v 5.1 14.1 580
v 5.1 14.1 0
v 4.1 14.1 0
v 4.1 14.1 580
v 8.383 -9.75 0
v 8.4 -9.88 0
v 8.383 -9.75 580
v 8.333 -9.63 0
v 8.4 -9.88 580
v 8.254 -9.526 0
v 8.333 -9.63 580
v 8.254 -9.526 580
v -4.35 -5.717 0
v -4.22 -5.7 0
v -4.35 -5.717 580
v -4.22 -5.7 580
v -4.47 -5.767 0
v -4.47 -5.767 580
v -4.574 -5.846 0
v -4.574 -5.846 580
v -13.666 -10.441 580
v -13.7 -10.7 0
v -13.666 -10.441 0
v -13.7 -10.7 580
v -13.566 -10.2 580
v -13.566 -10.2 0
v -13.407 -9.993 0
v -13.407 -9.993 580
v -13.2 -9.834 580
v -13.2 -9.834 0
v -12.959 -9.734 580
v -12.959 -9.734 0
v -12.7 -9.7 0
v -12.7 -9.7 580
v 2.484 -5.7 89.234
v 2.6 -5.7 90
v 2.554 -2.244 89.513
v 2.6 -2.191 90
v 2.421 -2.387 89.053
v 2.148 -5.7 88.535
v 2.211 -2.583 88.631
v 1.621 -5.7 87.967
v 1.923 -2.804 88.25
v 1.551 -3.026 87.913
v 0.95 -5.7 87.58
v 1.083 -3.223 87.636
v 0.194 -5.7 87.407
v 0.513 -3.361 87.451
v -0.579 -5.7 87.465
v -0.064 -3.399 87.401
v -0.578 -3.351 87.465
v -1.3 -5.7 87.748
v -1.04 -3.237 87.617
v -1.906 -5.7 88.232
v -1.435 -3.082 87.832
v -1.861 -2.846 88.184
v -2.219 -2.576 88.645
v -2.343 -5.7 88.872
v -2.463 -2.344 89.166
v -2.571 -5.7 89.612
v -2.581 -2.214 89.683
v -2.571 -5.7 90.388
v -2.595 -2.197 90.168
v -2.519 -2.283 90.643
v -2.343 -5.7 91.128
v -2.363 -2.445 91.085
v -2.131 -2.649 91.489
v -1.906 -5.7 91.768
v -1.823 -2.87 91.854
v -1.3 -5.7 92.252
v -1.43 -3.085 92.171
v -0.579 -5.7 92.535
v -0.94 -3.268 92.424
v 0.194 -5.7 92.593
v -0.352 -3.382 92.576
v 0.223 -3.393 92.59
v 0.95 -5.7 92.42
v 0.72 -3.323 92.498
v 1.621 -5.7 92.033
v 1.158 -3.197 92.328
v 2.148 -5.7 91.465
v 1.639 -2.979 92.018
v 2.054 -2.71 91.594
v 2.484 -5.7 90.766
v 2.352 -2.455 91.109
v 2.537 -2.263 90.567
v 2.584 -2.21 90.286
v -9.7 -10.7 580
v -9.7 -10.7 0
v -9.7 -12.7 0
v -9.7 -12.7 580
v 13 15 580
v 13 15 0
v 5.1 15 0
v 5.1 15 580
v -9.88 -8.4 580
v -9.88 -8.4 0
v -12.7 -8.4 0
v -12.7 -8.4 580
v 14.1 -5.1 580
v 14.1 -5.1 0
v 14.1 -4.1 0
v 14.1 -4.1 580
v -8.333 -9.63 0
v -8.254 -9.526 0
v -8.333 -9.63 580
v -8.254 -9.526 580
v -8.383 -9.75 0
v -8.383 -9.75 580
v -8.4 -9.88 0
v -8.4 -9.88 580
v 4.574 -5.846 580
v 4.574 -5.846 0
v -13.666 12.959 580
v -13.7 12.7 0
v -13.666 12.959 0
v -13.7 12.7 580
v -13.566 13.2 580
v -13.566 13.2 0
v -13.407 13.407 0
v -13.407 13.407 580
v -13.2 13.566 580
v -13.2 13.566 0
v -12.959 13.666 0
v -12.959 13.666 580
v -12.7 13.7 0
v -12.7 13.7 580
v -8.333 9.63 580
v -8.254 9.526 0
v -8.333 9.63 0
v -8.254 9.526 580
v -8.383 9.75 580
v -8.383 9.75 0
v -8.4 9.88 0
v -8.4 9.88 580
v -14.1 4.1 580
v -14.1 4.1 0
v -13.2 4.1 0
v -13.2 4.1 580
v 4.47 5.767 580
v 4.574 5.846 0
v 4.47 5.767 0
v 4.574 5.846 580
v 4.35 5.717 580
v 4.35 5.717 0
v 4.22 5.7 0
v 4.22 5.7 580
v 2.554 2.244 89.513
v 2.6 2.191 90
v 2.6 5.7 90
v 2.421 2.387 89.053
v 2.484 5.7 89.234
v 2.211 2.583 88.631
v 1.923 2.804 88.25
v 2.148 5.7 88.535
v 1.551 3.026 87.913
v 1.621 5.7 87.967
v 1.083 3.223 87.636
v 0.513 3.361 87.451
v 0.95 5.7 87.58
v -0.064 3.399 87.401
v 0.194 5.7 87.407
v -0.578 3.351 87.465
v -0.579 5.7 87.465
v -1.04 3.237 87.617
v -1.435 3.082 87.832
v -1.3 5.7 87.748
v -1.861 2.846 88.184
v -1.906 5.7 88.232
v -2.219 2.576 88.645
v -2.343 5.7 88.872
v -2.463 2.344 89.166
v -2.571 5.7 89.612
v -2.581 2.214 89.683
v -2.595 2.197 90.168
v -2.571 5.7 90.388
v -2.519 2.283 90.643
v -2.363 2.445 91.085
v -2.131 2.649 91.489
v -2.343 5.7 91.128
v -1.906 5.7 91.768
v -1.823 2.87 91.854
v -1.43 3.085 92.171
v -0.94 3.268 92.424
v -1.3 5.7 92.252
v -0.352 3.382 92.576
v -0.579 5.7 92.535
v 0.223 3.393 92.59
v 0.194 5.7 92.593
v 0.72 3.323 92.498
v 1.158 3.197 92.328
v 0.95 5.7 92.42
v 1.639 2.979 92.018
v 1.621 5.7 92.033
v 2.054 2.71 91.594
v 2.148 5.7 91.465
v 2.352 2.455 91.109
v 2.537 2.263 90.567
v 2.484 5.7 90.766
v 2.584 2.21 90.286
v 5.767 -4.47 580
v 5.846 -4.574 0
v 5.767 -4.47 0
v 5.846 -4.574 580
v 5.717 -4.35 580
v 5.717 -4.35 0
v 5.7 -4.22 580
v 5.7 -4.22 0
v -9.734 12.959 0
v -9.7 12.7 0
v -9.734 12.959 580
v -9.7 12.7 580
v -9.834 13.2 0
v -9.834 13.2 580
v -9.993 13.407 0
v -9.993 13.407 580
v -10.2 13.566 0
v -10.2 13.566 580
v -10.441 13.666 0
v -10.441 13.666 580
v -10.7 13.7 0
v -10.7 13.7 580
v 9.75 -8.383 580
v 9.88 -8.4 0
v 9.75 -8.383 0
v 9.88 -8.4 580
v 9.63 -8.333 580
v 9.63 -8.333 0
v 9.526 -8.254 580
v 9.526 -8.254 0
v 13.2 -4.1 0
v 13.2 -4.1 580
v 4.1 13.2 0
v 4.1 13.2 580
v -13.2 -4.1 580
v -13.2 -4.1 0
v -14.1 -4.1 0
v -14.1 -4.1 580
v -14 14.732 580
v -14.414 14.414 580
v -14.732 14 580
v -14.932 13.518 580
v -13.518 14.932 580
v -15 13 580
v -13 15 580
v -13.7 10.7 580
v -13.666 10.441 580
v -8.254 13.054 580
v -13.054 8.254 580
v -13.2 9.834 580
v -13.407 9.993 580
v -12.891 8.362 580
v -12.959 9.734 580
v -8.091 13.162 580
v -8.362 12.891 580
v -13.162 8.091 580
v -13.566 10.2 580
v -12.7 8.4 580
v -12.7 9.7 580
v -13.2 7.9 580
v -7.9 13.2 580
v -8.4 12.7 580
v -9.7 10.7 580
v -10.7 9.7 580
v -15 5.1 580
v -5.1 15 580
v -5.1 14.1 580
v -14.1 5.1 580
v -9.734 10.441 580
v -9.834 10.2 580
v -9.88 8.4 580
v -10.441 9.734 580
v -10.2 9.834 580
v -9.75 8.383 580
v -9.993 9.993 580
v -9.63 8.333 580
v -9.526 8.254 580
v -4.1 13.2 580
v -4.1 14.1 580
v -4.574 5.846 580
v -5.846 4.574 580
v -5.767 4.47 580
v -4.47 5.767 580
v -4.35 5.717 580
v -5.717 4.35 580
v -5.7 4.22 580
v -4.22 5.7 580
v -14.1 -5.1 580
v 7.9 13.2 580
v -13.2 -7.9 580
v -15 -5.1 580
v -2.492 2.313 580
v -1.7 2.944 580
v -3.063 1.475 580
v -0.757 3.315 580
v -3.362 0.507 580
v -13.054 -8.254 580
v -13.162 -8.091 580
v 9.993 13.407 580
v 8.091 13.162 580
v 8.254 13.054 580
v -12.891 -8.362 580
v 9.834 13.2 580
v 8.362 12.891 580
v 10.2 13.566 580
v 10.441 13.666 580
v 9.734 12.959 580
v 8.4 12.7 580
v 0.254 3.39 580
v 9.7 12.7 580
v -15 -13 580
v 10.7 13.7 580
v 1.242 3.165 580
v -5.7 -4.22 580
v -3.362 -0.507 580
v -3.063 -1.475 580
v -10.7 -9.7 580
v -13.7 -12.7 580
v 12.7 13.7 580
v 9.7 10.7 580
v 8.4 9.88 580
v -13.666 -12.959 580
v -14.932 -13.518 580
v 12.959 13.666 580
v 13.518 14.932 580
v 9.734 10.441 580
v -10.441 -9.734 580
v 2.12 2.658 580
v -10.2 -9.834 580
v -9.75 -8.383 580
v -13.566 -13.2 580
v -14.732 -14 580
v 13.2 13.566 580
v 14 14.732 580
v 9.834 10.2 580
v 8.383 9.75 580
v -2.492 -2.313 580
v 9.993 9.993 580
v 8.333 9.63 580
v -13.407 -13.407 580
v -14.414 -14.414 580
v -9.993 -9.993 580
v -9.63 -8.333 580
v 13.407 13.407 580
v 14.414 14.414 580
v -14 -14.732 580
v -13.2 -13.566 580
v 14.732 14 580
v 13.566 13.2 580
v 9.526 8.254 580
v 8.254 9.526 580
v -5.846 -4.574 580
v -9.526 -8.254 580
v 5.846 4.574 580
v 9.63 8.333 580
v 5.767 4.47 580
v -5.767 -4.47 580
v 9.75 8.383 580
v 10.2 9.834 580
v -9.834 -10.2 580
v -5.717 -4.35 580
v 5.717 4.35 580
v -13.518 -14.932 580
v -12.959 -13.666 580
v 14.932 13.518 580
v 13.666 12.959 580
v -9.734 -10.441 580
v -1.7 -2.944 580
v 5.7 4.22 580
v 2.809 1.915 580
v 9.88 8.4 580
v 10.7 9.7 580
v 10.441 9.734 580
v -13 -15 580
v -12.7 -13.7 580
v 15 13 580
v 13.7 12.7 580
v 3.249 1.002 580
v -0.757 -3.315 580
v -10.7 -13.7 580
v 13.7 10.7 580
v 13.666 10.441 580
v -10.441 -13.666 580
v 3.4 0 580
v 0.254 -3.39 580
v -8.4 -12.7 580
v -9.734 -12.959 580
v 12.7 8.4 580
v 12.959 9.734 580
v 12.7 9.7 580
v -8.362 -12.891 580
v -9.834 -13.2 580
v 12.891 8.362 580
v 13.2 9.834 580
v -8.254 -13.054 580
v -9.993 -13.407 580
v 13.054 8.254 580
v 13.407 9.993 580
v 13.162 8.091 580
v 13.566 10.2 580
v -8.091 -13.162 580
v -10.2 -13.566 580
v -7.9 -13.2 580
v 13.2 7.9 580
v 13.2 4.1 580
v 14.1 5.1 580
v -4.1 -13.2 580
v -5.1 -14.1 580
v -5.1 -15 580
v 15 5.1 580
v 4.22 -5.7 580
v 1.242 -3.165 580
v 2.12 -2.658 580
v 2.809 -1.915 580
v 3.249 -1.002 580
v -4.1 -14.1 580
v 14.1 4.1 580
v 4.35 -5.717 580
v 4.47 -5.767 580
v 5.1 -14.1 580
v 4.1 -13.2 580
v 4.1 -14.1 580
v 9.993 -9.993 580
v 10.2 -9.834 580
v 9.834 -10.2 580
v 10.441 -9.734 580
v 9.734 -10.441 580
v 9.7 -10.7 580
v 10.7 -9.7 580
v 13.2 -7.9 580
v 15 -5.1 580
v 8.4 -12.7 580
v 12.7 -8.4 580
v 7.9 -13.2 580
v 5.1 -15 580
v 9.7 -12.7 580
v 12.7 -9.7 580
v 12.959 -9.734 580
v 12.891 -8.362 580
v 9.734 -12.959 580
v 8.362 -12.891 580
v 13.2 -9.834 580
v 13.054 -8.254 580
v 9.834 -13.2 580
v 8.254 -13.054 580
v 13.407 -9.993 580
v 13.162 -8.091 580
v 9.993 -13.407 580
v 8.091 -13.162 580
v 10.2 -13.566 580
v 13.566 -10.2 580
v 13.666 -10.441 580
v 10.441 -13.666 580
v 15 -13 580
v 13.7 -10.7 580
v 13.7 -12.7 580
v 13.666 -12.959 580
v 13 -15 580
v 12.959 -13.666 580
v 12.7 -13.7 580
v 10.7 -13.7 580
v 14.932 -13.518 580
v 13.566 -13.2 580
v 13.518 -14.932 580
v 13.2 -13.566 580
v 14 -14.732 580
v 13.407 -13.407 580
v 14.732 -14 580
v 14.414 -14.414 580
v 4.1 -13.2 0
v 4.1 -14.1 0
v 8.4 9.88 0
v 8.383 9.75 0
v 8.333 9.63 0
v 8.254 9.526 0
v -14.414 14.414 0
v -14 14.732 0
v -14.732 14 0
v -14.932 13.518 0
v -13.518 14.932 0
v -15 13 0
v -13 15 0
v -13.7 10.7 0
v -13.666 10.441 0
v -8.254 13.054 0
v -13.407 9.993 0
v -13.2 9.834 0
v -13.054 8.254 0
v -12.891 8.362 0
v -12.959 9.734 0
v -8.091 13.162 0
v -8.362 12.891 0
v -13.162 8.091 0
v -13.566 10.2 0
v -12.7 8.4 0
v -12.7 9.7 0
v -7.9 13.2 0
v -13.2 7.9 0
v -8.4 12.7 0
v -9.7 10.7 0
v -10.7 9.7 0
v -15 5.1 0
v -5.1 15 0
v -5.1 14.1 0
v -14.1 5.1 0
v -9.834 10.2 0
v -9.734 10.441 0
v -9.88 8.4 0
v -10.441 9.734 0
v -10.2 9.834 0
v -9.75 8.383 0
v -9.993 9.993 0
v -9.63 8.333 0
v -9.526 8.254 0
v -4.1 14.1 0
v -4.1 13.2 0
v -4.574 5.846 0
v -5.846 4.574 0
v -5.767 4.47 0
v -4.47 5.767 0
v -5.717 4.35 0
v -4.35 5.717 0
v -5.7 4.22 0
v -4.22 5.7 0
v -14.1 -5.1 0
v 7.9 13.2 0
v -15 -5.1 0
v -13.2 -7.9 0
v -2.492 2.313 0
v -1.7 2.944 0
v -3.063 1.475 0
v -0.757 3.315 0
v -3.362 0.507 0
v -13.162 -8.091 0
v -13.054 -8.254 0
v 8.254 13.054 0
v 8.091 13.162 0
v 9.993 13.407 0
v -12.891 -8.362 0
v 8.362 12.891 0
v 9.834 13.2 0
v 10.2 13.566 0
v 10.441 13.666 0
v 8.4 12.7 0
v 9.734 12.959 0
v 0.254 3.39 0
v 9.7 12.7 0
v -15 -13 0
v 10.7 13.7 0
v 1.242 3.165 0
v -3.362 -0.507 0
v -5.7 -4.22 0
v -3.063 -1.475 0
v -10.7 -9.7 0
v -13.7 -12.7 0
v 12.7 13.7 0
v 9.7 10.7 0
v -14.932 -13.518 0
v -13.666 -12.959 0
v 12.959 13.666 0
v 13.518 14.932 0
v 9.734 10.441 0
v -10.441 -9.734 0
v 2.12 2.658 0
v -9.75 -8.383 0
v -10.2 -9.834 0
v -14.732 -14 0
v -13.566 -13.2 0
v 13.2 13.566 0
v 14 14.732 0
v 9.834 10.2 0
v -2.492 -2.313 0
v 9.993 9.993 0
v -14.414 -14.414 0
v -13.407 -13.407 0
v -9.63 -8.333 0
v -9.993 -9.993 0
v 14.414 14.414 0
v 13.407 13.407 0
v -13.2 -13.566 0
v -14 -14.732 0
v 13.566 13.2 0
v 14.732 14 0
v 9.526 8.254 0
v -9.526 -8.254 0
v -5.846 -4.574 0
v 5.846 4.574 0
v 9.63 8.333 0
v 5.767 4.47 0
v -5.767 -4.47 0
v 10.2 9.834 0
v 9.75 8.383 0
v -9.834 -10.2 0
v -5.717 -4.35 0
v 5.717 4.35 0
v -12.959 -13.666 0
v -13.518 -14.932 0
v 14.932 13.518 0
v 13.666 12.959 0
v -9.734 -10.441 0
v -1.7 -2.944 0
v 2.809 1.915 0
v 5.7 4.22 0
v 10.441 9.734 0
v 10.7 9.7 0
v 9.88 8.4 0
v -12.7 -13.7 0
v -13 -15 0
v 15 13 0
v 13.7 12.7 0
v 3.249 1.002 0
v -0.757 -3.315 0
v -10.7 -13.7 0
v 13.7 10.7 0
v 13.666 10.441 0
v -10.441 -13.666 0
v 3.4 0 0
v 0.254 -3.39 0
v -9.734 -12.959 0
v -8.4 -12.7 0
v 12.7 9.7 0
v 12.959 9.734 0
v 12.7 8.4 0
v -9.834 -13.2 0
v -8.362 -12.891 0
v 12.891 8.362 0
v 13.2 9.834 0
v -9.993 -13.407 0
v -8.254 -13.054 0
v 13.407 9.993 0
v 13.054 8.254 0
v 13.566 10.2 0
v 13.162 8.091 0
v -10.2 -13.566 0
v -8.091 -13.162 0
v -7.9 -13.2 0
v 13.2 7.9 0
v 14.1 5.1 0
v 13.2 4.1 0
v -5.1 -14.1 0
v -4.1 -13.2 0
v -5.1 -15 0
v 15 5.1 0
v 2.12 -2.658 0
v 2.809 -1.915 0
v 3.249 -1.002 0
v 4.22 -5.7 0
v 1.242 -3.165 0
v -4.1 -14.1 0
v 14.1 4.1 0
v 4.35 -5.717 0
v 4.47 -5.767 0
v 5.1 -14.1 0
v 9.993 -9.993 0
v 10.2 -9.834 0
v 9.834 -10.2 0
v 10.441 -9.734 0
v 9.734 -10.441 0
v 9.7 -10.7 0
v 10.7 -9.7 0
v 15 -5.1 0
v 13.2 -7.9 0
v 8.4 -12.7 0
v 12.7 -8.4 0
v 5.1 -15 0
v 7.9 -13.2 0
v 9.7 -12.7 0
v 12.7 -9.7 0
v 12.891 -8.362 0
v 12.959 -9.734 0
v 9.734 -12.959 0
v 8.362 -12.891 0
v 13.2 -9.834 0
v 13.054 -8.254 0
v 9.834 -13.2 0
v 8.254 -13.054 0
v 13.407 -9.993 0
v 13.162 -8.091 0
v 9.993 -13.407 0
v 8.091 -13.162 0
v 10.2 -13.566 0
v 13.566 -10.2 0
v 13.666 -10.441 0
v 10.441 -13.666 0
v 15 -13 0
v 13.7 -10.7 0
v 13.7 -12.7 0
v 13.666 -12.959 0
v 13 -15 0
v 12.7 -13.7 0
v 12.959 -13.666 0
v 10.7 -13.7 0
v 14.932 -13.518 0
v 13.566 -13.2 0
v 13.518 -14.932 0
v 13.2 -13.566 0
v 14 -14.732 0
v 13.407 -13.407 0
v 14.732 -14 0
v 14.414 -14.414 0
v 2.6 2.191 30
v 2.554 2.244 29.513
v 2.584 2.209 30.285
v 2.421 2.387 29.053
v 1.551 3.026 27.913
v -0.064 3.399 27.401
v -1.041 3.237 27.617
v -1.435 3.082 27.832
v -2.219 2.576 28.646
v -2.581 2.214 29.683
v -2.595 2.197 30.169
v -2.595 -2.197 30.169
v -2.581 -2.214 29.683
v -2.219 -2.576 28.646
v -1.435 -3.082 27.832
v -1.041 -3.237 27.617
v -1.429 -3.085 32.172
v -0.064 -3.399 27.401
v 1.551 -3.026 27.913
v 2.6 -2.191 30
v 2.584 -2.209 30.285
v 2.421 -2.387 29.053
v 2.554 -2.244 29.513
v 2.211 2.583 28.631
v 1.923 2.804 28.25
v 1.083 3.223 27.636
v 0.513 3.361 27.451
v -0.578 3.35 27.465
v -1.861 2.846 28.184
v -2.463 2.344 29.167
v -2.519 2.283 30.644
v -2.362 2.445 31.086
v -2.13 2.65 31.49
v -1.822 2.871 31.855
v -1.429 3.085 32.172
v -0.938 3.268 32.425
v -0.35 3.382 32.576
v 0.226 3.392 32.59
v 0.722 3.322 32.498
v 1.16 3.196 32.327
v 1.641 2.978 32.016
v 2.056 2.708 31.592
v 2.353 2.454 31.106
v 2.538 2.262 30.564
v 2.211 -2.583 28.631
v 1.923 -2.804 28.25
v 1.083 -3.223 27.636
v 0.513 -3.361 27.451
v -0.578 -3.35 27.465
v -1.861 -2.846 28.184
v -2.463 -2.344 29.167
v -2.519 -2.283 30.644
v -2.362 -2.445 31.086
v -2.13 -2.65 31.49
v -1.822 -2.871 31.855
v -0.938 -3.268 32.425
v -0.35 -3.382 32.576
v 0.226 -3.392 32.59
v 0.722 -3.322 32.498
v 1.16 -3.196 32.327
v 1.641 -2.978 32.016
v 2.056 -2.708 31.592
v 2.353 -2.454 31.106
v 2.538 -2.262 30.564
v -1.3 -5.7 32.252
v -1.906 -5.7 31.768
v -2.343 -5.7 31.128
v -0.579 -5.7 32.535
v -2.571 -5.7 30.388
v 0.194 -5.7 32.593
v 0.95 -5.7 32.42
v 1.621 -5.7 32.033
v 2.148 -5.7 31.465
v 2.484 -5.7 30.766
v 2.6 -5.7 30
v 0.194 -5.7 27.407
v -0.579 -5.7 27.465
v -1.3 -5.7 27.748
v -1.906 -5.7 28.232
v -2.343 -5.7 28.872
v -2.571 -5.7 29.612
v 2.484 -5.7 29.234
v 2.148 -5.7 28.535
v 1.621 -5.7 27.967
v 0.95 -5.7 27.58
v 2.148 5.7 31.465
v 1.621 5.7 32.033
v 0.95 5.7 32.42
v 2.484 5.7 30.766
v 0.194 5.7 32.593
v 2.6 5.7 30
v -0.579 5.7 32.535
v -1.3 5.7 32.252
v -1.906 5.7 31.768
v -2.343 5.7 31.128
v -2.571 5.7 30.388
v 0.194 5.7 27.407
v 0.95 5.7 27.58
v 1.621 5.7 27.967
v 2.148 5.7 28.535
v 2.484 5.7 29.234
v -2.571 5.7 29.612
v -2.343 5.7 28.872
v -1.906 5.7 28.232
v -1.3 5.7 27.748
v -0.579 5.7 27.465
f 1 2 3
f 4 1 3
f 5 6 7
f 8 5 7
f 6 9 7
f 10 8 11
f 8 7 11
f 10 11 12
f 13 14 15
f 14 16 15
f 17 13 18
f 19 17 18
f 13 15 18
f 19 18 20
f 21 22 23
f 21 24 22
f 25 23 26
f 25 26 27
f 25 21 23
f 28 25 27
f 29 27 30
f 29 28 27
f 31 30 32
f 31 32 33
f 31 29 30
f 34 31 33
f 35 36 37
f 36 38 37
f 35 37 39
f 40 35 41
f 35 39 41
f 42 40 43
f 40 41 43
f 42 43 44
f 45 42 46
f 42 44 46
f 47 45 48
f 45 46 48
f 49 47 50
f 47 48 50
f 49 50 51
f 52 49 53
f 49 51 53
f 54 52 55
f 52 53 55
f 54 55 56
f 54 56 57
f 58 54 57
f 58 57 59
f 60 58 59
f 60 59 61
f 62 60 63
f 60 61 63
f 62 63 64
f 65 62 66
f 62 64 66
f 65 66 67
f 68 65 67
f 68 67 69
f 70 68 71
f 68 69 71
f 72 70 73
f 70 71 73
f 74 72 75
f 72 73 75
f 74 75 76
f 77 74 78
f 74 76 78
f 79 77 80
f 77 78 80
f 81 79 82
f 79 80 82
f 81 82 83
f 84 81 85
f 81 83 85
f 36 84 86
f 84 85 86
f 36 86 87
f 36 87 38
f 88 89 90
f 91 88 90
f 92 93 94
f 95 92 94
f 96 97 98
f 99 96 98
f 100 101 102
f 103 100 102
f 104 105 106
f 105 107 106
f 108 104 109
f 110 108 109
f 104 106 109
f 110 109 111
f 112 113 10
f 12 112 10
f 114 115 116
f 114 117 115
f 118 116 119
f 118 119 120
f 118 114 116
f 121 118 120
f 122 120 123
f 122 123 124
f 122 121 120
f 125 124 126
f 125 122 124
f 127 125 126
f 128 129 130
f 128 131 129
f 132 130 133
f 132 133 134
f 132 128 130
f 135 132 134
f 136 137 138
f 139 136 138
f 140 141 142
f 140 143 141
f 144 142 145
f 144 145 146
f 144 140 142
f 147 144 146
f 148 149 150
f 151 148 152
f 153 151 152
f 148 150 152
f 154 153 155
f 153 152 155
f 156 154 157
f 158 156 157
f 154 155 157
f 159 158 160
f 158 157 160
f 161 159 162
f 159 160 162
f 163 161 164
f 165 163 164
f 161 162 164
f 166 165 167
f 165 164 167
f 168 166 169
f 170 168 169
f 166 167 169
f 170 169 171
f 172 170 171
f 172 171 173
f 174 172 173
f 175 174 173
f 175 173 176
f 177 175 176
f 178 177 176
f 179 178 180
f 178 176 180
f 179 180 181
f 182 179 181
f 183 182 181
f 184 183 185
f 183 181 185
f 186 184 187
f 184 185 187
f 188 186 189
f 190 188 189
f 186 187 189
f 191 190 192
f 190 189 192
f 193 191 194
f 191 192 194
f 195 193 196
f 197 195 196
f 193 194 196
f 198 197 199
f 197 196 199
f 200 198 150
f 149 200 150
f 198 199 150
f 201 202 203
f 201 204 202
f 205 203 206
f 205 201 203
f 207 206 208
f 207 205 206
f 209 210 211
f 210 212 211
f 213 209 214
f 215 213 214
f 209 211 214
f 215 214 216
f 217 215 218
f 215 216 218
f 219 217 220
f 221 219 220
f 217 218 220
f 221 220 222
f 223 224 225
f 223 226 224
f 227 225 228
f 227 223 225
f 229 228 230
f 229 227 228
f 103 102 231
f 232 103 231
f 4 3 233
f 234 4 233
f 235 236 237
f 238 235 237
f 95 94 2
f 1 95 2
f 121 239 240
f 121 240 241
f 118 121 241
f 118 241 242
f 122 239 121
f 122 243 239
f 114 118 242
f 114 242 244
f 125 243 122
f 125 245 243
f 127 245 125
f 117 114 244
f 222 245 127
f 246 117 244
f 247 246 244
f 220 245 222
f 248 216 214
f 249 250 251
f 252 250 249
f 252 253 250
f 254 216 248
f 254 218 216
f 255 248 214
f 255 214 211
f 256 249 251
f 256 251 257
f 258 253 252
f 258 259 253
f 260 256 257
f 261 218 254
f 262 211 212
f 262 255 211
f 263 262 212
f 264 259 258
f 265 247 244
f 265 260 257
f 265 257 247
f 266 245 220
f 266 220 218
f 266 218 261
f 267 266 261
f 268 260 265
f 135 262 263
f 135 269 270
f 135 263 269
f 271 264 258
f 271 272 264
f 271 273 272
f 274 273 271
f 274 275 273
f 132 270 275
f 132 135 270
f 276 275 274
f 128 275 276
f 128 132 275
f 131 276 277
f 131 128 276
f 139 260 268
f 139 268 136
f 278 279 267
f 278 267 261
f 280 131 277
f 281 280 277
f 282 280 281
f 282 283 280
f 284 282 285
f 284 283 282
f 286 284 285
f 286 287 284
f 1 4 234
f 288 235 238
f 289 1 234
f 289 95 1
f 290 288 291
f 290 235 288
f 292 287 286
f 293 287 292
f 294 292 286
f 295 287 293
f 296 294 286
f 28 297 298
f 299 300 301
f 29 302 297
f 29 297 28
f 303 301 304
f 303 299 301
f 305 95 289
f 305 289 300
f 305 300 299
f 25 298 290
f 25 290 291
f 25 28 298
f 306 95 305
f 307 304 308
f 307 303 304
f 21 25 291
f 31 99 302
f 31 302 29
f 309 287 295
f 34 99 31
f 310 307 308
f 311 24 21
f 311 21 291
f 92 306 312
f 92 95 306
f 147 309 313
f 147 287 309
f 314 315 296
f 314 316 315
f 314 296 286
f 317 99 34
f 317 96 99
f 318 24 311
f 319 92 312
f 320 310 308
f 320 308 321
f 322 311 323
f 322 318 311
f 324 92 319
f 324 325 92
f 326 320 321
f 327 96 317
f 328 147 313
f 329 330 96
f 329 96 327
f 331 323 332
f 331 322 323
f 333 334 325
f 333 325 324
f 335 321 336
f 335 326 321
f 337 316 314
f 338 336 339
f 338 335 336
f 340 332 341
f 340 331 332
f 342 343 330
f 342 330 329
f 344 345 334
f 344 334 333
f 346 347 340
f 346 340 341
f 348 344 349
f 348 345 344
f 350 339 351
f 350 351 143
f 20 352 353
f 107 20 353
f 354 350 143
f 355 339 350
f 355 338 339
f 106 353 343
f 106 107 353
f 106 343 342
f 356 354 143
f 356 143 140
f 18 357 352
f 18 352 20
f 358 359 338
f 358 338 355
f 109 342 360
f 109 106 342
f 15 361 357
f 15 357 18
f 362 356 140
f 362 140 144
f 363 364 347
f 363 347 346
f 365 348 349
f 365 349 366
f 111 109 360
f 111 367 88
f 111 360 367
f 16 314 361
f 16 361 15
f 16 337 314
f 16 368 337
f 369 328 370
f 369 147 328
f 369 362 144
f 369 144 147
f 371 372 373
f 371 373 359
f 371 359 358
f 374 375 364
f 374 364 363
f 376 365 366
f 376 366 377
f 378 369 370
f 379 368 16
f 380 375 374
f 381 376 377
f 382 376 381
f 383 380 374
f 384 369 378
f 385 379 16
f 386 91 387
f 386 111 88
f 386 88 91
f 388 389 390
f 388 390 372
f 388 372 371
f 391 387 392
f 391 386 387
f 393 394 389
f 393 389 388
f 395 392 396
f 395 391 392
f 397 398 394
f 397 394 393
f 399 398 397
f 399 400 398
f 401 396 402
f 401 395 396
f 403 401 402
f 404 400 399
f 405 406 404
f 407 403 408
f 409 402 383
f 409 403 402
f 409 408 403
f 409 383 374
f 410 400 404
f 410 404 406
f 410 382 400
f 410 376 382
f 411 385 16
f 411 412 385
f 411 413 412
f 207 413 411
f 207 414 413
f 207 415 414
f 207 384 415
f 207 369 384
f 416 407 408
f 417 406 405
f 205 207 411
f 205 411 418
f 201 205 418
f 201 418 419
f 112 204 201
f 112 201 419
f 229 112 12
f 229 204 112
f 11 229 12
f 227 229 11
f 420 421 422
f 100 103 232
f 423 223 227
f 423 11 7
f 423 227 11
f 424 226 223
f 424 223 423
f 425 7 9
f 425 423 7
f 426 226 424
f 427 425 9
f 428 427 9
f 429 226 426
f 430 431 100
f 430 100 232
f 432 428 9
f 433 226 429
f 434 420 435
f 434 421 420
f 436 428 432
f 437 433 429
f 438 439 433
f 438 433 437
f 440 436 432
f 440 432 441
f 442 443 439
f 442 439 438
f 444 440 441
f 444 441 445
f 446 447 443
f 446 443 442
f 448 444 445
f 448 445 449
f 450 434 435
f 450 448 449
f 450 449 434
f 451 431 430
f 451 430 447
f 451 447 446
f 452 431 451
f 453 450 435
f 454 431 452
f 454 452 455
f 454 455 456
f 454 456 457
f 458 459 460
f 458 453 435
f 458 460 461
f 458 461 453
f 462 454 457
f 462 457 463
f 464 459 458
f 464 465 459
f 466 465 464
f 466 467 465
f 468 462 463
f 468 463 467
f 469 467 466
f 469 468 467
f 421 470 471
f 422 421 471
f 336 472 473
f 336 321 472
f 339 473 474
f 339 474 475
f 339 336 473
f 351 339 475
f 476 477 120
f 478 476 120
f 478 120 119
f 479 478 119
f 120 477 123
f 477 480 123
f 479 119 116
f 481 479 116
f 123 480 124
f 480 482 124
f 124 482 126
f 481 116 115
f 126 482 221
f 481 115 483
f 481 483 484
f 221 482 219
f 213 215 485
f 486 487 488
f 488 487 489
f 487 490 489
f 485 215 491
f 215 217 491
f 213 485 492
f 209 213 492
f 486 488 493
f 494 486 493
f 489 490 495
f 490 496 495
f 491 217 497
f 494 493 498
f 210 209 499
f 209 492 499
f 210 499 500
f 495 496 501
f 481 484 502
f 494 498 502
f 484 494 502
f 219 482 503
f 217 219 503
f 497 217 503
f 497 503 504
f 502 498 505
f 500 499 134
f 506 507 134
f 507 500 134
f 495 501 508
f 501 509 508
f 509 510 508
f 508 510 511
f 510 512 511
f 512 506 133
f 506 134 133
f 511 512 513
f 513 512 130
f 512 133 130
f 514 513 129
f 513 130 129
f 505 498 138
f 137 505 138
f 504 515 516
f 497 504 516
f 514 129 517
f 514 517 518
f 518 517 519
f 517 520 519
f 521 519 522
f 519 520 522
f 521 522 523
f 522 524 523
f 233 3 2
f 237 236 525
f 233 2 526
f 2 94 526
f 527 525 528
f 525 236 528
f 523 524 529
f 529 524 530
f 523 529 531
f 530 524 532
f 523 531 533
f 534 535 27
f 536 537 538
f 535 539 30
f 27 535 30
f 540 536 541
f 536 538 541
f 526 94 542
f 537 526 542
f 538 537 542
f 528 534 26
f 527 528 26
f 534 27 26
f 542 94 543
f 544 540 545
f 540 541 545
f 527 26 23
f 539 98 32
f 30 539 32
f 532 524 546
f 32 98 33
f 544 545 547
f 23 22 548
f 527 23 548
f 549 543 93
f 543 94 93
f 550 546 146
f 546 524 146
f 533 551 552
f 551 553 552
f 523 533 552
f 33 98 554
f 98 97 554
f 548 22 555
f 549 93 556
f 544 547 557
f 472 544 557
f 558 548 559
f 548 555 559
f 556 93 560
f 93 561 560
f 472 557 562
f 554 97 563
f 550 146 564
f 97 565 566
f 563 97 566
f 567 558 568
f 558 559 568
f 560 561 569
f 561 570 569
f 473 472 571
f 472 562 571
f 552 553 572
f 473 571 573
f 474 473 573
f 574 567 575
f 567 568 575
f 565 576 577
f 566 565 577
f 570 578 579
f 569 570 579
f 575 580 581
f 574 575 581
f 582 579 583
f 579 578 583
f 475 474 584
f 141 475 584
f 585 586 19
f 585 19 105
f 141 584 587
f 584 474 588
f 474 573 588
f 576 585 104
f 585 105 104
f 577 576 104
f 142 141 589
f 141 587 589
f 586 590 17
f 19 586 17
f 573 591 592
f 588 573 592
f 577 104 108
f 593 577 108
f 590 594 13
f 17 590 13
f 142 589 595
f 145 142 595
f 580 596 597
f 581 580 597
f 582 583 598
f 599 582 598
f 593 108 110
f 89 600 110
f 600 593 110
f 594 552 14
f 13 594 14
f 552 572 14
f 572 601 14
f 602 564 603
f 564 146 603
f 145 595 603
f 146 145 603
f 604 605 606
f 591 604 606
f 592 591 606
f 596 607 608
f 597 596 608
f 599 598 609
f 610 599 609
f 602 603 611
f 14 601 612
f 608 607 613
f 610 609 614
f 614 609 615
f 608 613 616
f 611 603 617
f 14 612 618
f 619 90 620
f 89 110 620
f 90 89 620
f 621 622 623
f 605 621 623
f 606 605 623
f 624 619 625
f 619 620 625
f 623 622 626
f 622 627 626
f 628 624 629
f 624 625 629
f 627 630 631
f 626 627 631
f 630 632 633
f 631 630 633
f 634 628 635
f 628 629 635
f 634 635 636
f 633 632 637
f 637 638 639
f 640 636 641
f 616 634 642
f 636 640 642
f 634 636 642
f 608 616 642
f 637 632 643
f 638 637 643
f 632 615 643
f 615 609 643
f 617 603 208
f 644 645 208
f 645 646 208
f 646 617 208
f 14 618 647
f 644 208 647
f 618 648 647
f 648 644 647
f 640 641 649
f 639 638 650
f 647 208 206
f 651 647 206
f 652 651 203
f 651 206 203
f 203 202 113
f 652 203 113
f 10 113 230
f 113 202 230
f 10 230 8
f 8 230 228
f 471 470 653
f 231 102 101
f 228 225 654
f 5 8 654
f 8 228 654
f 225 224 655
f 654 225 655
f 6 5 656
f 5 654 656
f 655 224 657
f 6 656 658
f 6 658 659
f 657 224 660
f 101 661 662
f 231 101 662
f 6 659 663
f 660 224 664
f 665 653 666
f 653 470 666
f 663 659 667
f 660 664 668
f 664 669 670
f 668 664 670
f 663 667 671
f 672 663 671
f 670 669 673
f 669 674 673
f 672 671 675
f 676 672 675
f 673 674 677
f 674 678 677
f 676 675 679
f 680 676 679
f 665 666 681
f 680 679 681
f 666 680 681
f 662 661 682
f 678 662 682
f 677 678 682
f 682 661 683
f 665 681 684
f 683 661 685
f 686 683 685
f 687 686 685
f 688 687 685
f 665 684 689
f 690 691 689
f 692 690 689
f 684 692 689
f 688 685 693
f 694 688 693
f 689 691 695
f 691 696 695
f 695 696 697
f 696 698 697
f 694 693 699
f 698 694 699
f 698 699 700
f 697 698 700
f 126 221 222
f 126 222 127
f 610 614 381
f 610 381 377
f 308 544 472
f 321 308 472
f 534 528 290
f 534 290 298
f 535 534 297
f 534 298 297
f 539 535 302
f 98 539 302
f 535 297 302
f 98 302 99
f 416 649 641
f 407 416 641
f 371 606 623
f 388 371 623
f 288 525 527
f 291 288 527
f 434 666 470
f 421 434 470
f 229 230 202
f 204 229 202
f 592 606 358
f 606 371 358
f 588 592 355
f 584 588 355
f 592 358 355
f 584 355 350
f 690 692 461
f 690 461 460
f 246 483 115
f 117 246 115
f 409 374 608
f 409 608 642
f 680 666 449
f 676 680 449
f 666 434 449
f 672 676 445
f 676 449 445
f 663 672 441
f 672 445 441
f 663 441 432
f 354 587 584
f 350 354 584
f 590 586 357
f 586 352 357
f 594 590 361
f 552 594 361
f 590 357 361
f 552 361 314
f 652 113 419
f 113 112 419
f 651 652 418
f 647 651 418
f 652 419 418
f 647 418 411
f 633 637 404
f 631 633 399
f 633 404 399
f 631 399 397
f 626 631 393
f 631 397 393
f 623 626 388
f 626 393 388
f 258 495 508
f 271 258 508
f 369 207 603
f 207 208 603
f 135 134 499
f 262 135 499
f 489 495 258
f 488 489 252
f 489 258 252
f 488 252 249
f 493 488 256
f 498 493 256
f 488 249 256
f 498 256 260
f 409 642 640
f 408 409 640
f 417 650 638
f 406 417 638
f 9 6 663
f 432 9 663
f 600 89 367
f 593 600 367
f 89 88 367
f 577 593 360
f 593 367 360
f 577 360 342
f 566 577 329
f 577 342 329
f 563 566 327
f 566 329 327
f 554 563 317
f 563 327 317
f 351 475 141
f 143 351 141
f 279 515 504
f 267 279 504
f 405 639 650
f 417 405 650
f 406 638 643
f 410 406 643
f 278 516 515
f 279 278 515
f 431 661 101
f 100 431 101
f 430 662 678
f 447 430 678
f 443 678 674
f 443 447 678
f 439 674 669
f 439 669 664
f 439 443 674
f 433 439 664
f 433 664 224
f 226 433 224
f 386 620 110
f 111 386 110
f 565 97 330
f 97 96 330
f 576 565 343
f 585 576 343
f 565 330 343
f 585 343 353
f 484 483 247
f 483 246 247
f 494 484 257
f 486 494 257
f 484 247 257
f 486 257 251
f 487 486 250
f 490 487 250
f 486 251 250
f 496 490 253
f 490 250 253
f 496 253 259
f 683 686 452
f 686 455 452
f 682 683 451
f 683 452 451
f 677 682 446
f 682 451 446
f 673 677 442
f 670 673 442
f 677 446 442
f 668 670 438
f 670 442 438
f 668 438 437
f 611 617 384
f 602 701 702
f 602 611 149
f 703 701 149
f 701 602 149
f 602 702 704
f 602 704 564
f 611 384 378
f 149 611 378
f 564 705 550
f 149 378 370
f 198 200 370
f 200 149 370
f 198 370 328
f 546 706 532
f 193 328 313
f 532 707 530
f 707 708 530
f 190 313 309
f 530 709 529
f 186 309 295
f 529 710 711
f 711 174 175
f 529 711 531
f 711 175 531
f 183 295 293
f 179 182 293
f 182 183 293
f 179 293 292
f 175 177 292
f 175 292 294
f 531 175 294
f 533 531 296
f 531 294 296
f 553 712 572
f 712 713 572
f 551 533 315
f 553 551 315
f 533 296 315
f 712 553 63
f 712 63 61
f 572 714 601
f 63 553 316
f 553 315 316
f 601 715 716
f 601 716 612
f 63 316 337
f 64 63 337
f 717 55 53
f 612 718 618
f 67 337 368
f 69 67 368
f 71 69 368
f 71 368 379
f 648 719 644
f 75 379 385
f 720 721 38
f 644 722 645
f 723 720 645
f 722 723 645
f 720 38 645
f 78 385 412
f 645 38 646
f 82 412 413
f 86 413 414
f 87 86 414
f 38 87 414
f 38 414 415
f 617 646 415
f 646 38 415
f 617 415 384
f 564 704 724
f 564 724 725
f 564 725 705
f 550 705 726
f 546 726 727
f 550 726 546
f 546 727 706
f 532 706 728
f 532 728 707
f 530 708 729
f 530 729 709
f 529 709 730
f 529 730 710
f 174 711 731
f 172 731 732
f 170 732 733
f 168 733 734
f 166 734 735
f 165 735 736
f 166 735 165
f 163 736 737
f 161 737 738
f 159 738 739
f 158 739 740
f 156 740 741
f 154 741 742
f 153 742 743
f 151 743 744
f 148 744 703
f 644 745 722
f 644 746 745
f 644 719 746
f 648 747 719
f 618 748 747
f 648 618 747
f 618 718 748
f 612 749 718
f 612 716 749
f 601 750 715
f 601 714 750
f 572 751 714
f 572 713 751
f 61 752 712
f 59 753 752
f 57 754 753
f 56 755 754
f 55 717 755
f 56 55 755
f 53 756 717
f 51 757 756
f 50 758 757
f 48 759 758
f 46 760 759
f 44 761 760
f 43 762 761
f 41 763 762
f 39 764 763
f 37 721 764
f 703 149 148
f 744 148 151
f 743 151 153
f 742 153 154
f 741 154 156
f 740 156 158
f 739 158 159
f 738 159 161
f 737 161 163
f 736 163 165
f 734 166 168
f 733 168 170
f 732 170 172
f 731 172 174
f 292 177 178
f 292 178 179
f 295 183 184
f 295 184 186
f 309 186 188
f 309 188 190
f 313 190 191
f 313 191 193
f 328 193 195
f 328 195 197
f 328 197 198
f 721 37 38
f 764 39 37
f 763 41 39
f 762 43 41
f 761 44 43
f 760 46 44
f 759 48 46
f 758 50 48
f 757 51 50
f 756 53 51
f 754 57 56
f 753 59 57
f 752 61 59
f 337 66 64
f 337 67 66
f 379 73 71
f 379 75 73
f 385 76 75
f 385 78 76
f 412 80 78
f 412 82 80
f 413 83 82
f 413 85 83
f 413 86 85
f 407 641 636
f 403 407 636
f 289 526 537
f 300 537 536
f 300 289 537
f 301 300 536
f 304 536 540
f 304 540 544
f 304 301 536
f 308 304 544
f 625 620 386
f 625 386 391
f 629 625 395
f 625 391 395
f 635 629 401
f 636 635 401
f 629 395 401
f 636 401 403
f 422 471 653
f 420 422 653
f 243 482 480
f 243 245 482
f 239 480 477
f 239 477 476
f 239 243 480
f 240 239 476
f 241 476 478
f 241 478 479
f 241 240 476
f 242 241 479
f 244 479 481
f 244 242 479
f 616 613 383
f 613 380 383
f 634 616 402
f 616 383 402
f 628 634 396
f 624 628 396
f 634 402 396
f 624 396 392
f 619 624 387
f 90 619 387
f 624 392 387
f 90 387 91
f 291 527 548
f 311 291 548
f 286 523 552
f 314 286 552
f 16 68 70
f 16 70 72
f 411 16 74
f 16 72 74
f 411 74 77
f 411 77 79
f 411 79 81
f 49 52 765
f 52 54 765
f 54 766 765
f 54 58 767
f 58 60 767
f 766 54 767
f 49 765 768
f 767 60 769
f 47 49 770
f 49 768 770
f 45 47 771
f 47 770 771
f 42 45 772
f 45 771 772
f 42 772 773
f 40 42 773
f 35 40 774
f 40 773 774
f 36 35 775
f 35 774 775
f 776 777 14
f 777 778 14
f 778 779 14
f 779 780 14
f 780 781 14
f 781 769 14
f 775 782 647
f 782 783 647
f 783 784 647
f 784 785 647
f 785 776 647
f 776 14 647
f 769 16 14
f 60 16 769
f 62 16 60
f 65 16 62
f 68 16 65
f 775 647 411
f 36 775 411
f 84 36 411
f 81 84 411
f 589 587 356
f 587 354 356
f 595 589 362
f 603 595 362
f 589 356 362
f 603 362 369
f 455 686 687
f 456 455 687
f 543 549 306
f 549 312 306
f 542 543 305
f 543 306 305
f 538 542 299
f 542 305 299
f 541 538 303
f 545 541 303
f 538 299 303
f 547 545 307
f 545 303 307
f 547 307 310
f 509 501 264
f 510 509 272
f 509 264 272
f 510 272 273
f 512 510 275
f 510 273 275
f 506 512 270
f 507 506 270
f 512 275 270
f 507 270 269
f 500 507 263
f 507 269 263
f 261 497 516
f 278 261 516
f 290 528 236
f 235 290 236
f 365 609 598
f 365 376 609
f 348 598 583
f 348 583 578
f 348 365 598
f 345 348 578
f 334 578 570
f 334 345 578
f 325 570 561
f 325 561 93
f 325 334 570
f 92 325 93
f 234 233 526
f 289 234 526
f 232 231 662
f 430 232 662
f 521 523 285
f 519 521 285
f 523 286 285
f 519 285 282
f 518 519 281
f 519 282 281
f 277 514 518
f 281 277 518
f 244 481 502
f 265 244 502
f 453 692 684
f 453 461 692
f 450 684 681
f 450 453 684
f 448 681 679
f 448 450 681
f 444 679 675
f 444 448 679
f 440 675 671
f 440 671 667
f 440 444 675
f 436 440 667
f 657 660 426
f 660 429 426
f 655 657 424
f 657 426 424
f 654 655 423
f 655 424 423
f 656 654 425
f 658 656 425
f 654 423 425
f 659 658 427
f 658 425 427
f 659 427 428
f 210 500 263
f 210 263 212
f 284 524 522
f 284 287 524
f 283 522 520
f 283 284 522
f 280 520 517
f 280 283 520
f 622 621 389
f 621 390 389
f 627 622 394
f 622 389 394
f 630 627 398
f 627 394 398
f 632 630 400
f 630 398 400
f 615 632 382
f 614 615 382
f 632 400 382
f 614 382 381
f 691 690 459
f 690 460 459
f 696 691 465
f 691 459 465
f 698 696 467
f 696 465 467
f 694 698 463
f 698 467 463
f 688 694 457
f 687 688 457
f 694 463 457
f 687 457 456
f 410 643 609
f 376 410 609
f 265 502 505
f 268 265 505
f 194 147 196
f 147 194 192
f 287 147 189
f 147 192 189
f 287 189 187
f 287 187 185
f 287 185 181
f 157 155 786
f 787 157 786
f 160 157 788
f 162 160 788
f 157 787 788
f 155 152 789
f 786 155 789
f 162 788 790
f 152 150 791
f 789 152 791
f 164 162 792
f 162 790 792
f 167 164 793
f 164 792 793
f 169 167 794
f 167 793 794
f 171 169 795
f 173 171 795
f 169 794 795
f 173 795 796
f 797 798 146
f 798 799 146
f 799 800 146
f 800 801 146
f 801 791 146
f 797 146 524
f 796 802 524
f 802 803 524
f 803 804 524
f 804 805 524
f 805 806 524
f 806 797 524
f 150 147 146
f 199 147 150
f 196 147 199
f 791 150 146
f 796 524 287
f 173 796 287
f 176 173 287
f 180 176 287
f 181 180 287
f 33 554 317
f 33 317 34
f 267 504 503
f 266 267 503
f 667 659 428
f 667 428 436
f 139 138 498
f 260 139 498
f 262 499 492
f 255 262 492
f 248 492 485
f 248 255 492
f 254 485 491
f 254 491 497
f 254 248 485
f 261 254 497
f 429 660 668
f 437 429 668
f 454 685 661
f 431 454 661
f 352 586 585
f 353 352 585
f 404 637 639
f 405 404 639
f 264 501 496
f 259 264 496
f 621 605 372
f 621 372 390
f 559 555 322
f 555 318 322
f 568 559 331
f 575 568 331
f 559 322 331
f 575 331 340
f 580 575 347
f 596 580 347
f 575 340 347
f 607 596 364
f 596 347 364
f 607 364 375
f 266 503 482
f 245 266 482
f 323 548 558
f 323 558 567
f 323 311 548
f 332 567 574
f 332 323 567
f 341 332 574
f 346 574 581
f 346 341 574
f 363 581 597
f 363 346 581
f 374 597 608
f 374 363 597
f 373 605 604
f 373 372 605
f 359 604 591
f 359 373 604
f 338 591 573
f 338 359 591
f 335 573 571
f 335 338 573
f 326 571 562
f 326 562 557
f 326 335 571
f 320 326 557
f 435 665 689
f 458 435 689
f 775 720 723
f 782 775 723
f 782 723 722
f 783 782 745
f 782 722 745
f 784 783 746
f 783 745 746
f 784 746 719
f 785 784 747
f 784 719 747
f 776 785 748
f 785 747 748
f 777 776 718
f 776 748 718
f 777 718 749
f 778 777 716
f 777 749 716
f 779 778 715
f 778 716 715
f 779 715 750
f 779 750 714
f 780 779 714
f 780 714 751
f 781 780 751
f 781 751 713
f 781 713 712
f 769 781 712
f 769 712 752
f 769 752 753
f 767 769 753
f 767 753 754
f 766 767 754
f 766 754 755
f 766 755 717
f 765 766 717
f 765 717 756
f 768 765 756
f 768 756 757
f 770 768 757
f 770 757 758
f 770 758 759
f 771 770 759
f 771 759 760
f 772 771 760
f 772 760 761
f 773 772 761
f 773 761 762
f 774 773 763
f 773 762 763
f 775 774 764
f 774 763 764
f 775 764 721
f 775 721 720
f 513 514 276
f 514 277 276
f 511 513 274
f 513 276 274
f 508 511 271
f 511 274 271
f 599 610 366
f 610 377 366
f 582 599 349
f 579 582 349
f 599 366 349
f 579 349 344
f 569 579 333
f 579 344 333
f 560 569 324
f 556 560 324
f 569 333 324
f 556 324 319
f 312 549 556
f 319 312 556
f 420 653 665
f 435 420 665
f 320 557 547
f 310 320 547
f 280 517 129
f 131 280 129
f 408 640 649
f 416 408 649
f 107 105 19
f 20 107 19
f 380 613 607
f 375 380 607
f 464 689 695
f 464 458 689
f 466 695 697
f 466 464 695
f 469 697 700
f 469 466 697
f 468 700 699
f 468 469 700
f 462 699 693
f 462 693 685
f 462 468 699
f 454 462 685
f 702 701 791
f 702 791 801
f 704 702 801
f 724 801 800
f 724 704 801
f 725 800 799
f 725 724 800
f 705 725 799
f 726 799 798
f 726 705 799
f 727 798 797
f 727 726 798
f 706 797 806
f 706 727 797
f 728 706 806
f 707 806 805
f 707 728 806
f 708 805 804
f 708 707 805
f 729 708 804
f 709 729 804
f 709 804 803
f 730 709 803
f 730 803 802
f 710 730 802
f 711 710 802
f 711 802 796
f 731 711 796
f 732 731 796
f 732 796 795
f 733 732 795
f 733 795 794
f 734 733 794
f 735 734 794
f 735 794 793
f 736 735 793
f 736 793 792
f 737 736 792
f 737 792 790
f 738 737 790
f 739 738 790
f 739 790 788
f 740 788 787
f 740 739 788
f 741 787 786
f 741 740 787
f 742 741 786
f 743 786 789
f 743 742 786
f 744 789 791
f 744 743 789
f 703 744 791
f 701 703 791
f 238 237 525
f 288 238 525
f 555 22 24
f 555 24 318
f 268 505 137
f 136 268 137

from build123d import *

# Parameters (mm, degrees)
SKETCH_1_W                       = 4
SKETCH_1_H                       = 4
EXTRUDE_1_DEPTH                  = 580
FILLET_1_R                       = 1
FILLET_2_R                       = 2
FILLET_3_R                       = 0.5
PATTERN_CIRCULAR_1_COUNT         = 4
FILLET_1_OF_PATTERN_CIRCULAR_1_R = 1
FILLET_2_OF_PATTERN_CIRCULAR_1_R = 2
FILLET_3_OF_PATTERN_CIRCULAR_1_R = 0.5
SKETCH_2_R                       = 3.4
CUT_EXTRUDE_1_DEPTH              = 581
SKETCH_3_R                       = 2.6
CUT_EXTRUDE_2_DEPTH              = 10


with BuildPart() as part:
    # 草图1 → 凸台-拉伸1 (new body)
    with BuildSketch(Plane.XY):
        Polygon((5.7, 0), (5.7, 4.427207794), (9.672792206, 8.4), (13.2, 8.4), (13.2, 4.1), (14.1, 4.1), (14.1, 5.1), (15, 5.1), (15, 15), (5.1, 15), (5.1, 14.1), (4.1, 14.1), (4.1, 13.2), (8.4, 13.2), (8.4, 9.672792206), (4.427207794, 5.7), (0, 5.7), (0, 0), align=None)
        with Locations((11.7, 11.7)):
            Rectangle(SKETCH_1_W, SKETCH_1_H, mode=Mode.SUBTRACT)
    extrude_1 = extrude(amount=EXTRUDE_1_DEPTH)

    # 圆角1
    fillet_1_edges = [part.edges().sort_by_distance(p)[0] for p in [
        (13.7, 9.7, 290),
        (13.7, 13.7, 290),
        (9.7, 13.7, 290),
        (9.7, 9.7, 290),
    ]]
    fillet(fillet_1_edges, radius=FILLET_1_R)

    # 圆角2
    fillet_2_edges = [part.edges().sort_by_distance(p)[0] for p in [
        (15, 15, 290),
    ]]
    fillet(fillet_2_edges, radius=FILLET_2_R)

    # 圆角3
    fillet_3_edges = [part.edges().sort_by_distance(p)[0] for p in [
        (4.427207794, 5.7, 290),
        (8.4, 9.672792206, 290),
        (8.4, 13.2, 290),
        (13.2, 8.4, 290),
        (9.672792206, 8.4, 290),
        (5.7, 4.427207794, 290),
    ]]
    fillet(fillet_3_edges, radius=FILLET_3_R)

    # 阵列(圆周)1: 凸台-拉伸1 ×4 about axis
    pattern_circular_1_axis = Axis((0, 0, 0), (0, 0, 1))
    for i in range(1, PATTERN_CIRCULAR_1_COUNT):
        add(extrude_1.rotate(pattern_circular_1_axis, i * 360 / PATTERN_CIRCULAR_1_COUNT))

    # 圆角1 of 阵列(圆周)1
    fillet_1_of_pattern_circular_1_edges = [part.edges().sort_by_distance(p)[0] for p in [
        (-9.7, 13.7, 290),
        (-13.7, 13.7, 290),
        (-13.7, 9.7, 290),
        (-9.7, 9.7, 290),
        (-13.7, -9.7, 290),
        (-13.7, -13.7, 290),
        (-9.7, -13.7, 290),
        (-9.7, -9.7, 290),
        (9.7, -13.7, 290),
        (13.7, -13.7, 290),
        (13.7, -9.7, 290),
        (9.7, -9.7, 290),
    ]]
    fillet(fillet_1_of_pattern_circular_1_edges, radius=FILLET_1_OF_PATTERN_CIRCULAR_1_R)

    # 圆角2 of 阵列(圆周)1
    fillet_2_of_pattern_circular_1_edges = [part.edges().sort_by_distance(p)[0] for p in [
        (-15, 15, 290),
        (-15, -15, 290),
        (15, -15, 290),
    ]]
    fillet(fillet_2_of_pattern_circular_1_edges, radius=FILLET_2_OF_PATTERN_CIRCULAR_1_R)

    # 圆角3 of 阵列(圆周)1
    fillet_3_of_pattern_circular_1_edges = [part.edges().sort_by_distance(p)[0] for p in [
        (-5.7, 4.427207794, 290),
        (-9.672792206, 8.4, 290),
        (-13.2, 8.4, 290),
        (-8.4, 13.2, 290),
        (-8.4, 9.672792206, 290),
        (-4.427207794, 5.7, 290),
        (-4.427207794, -5.7, 290),
        (-8.4, -9.672792206, 290),
        (-8.4, -13.2, 290),
        (-13.2, -8.4, 290),
        (-9.672792206, -8.4, 290),
        (-5.7, -4.427207794, 290),
        (5.7, -4.427207794, 290),
        (9.672792206, -8.4, 290),
        (13.2, -8.4, 290),
        (8.4, -13.2, 290),
        (8.4, -9.672792206, 290),
        (4.427207794, -5.7, 290),
    ]]
    fillet(fillet_3_of_pattern_circular_1_edges, radius=FILLET_3_OF_PATTERN_CIRCULAR_1_R)

    # 草图2 → 切除-拉伸1 (cut, through all)
    with BuildSketch(Plane.XY.offset(580)):
        Circle(SKETCH_2_R)
    extrude(amount=-CUT_EXTRUDE_1_DEPTH, mode=Mode.SUBTRACT)

    # 草图3 → 切除-拉伸2 (cut, symmetric)
    with BuildSketch(Plane(origin=(0, 0, 0), x_dir=(1, 0, 0), z_dir=(0, 1, 0))):
        with Locations((0, -30)):
            Circle(SKETCH_3_R)
        with Locations((0, -90)):
            Circle(SKETCH_3_R)
    extrude(amount=CUT_EXTRUDE_2_DEPTH, both=True, mode=Mode.SUBTRACT)


solid = part.part
